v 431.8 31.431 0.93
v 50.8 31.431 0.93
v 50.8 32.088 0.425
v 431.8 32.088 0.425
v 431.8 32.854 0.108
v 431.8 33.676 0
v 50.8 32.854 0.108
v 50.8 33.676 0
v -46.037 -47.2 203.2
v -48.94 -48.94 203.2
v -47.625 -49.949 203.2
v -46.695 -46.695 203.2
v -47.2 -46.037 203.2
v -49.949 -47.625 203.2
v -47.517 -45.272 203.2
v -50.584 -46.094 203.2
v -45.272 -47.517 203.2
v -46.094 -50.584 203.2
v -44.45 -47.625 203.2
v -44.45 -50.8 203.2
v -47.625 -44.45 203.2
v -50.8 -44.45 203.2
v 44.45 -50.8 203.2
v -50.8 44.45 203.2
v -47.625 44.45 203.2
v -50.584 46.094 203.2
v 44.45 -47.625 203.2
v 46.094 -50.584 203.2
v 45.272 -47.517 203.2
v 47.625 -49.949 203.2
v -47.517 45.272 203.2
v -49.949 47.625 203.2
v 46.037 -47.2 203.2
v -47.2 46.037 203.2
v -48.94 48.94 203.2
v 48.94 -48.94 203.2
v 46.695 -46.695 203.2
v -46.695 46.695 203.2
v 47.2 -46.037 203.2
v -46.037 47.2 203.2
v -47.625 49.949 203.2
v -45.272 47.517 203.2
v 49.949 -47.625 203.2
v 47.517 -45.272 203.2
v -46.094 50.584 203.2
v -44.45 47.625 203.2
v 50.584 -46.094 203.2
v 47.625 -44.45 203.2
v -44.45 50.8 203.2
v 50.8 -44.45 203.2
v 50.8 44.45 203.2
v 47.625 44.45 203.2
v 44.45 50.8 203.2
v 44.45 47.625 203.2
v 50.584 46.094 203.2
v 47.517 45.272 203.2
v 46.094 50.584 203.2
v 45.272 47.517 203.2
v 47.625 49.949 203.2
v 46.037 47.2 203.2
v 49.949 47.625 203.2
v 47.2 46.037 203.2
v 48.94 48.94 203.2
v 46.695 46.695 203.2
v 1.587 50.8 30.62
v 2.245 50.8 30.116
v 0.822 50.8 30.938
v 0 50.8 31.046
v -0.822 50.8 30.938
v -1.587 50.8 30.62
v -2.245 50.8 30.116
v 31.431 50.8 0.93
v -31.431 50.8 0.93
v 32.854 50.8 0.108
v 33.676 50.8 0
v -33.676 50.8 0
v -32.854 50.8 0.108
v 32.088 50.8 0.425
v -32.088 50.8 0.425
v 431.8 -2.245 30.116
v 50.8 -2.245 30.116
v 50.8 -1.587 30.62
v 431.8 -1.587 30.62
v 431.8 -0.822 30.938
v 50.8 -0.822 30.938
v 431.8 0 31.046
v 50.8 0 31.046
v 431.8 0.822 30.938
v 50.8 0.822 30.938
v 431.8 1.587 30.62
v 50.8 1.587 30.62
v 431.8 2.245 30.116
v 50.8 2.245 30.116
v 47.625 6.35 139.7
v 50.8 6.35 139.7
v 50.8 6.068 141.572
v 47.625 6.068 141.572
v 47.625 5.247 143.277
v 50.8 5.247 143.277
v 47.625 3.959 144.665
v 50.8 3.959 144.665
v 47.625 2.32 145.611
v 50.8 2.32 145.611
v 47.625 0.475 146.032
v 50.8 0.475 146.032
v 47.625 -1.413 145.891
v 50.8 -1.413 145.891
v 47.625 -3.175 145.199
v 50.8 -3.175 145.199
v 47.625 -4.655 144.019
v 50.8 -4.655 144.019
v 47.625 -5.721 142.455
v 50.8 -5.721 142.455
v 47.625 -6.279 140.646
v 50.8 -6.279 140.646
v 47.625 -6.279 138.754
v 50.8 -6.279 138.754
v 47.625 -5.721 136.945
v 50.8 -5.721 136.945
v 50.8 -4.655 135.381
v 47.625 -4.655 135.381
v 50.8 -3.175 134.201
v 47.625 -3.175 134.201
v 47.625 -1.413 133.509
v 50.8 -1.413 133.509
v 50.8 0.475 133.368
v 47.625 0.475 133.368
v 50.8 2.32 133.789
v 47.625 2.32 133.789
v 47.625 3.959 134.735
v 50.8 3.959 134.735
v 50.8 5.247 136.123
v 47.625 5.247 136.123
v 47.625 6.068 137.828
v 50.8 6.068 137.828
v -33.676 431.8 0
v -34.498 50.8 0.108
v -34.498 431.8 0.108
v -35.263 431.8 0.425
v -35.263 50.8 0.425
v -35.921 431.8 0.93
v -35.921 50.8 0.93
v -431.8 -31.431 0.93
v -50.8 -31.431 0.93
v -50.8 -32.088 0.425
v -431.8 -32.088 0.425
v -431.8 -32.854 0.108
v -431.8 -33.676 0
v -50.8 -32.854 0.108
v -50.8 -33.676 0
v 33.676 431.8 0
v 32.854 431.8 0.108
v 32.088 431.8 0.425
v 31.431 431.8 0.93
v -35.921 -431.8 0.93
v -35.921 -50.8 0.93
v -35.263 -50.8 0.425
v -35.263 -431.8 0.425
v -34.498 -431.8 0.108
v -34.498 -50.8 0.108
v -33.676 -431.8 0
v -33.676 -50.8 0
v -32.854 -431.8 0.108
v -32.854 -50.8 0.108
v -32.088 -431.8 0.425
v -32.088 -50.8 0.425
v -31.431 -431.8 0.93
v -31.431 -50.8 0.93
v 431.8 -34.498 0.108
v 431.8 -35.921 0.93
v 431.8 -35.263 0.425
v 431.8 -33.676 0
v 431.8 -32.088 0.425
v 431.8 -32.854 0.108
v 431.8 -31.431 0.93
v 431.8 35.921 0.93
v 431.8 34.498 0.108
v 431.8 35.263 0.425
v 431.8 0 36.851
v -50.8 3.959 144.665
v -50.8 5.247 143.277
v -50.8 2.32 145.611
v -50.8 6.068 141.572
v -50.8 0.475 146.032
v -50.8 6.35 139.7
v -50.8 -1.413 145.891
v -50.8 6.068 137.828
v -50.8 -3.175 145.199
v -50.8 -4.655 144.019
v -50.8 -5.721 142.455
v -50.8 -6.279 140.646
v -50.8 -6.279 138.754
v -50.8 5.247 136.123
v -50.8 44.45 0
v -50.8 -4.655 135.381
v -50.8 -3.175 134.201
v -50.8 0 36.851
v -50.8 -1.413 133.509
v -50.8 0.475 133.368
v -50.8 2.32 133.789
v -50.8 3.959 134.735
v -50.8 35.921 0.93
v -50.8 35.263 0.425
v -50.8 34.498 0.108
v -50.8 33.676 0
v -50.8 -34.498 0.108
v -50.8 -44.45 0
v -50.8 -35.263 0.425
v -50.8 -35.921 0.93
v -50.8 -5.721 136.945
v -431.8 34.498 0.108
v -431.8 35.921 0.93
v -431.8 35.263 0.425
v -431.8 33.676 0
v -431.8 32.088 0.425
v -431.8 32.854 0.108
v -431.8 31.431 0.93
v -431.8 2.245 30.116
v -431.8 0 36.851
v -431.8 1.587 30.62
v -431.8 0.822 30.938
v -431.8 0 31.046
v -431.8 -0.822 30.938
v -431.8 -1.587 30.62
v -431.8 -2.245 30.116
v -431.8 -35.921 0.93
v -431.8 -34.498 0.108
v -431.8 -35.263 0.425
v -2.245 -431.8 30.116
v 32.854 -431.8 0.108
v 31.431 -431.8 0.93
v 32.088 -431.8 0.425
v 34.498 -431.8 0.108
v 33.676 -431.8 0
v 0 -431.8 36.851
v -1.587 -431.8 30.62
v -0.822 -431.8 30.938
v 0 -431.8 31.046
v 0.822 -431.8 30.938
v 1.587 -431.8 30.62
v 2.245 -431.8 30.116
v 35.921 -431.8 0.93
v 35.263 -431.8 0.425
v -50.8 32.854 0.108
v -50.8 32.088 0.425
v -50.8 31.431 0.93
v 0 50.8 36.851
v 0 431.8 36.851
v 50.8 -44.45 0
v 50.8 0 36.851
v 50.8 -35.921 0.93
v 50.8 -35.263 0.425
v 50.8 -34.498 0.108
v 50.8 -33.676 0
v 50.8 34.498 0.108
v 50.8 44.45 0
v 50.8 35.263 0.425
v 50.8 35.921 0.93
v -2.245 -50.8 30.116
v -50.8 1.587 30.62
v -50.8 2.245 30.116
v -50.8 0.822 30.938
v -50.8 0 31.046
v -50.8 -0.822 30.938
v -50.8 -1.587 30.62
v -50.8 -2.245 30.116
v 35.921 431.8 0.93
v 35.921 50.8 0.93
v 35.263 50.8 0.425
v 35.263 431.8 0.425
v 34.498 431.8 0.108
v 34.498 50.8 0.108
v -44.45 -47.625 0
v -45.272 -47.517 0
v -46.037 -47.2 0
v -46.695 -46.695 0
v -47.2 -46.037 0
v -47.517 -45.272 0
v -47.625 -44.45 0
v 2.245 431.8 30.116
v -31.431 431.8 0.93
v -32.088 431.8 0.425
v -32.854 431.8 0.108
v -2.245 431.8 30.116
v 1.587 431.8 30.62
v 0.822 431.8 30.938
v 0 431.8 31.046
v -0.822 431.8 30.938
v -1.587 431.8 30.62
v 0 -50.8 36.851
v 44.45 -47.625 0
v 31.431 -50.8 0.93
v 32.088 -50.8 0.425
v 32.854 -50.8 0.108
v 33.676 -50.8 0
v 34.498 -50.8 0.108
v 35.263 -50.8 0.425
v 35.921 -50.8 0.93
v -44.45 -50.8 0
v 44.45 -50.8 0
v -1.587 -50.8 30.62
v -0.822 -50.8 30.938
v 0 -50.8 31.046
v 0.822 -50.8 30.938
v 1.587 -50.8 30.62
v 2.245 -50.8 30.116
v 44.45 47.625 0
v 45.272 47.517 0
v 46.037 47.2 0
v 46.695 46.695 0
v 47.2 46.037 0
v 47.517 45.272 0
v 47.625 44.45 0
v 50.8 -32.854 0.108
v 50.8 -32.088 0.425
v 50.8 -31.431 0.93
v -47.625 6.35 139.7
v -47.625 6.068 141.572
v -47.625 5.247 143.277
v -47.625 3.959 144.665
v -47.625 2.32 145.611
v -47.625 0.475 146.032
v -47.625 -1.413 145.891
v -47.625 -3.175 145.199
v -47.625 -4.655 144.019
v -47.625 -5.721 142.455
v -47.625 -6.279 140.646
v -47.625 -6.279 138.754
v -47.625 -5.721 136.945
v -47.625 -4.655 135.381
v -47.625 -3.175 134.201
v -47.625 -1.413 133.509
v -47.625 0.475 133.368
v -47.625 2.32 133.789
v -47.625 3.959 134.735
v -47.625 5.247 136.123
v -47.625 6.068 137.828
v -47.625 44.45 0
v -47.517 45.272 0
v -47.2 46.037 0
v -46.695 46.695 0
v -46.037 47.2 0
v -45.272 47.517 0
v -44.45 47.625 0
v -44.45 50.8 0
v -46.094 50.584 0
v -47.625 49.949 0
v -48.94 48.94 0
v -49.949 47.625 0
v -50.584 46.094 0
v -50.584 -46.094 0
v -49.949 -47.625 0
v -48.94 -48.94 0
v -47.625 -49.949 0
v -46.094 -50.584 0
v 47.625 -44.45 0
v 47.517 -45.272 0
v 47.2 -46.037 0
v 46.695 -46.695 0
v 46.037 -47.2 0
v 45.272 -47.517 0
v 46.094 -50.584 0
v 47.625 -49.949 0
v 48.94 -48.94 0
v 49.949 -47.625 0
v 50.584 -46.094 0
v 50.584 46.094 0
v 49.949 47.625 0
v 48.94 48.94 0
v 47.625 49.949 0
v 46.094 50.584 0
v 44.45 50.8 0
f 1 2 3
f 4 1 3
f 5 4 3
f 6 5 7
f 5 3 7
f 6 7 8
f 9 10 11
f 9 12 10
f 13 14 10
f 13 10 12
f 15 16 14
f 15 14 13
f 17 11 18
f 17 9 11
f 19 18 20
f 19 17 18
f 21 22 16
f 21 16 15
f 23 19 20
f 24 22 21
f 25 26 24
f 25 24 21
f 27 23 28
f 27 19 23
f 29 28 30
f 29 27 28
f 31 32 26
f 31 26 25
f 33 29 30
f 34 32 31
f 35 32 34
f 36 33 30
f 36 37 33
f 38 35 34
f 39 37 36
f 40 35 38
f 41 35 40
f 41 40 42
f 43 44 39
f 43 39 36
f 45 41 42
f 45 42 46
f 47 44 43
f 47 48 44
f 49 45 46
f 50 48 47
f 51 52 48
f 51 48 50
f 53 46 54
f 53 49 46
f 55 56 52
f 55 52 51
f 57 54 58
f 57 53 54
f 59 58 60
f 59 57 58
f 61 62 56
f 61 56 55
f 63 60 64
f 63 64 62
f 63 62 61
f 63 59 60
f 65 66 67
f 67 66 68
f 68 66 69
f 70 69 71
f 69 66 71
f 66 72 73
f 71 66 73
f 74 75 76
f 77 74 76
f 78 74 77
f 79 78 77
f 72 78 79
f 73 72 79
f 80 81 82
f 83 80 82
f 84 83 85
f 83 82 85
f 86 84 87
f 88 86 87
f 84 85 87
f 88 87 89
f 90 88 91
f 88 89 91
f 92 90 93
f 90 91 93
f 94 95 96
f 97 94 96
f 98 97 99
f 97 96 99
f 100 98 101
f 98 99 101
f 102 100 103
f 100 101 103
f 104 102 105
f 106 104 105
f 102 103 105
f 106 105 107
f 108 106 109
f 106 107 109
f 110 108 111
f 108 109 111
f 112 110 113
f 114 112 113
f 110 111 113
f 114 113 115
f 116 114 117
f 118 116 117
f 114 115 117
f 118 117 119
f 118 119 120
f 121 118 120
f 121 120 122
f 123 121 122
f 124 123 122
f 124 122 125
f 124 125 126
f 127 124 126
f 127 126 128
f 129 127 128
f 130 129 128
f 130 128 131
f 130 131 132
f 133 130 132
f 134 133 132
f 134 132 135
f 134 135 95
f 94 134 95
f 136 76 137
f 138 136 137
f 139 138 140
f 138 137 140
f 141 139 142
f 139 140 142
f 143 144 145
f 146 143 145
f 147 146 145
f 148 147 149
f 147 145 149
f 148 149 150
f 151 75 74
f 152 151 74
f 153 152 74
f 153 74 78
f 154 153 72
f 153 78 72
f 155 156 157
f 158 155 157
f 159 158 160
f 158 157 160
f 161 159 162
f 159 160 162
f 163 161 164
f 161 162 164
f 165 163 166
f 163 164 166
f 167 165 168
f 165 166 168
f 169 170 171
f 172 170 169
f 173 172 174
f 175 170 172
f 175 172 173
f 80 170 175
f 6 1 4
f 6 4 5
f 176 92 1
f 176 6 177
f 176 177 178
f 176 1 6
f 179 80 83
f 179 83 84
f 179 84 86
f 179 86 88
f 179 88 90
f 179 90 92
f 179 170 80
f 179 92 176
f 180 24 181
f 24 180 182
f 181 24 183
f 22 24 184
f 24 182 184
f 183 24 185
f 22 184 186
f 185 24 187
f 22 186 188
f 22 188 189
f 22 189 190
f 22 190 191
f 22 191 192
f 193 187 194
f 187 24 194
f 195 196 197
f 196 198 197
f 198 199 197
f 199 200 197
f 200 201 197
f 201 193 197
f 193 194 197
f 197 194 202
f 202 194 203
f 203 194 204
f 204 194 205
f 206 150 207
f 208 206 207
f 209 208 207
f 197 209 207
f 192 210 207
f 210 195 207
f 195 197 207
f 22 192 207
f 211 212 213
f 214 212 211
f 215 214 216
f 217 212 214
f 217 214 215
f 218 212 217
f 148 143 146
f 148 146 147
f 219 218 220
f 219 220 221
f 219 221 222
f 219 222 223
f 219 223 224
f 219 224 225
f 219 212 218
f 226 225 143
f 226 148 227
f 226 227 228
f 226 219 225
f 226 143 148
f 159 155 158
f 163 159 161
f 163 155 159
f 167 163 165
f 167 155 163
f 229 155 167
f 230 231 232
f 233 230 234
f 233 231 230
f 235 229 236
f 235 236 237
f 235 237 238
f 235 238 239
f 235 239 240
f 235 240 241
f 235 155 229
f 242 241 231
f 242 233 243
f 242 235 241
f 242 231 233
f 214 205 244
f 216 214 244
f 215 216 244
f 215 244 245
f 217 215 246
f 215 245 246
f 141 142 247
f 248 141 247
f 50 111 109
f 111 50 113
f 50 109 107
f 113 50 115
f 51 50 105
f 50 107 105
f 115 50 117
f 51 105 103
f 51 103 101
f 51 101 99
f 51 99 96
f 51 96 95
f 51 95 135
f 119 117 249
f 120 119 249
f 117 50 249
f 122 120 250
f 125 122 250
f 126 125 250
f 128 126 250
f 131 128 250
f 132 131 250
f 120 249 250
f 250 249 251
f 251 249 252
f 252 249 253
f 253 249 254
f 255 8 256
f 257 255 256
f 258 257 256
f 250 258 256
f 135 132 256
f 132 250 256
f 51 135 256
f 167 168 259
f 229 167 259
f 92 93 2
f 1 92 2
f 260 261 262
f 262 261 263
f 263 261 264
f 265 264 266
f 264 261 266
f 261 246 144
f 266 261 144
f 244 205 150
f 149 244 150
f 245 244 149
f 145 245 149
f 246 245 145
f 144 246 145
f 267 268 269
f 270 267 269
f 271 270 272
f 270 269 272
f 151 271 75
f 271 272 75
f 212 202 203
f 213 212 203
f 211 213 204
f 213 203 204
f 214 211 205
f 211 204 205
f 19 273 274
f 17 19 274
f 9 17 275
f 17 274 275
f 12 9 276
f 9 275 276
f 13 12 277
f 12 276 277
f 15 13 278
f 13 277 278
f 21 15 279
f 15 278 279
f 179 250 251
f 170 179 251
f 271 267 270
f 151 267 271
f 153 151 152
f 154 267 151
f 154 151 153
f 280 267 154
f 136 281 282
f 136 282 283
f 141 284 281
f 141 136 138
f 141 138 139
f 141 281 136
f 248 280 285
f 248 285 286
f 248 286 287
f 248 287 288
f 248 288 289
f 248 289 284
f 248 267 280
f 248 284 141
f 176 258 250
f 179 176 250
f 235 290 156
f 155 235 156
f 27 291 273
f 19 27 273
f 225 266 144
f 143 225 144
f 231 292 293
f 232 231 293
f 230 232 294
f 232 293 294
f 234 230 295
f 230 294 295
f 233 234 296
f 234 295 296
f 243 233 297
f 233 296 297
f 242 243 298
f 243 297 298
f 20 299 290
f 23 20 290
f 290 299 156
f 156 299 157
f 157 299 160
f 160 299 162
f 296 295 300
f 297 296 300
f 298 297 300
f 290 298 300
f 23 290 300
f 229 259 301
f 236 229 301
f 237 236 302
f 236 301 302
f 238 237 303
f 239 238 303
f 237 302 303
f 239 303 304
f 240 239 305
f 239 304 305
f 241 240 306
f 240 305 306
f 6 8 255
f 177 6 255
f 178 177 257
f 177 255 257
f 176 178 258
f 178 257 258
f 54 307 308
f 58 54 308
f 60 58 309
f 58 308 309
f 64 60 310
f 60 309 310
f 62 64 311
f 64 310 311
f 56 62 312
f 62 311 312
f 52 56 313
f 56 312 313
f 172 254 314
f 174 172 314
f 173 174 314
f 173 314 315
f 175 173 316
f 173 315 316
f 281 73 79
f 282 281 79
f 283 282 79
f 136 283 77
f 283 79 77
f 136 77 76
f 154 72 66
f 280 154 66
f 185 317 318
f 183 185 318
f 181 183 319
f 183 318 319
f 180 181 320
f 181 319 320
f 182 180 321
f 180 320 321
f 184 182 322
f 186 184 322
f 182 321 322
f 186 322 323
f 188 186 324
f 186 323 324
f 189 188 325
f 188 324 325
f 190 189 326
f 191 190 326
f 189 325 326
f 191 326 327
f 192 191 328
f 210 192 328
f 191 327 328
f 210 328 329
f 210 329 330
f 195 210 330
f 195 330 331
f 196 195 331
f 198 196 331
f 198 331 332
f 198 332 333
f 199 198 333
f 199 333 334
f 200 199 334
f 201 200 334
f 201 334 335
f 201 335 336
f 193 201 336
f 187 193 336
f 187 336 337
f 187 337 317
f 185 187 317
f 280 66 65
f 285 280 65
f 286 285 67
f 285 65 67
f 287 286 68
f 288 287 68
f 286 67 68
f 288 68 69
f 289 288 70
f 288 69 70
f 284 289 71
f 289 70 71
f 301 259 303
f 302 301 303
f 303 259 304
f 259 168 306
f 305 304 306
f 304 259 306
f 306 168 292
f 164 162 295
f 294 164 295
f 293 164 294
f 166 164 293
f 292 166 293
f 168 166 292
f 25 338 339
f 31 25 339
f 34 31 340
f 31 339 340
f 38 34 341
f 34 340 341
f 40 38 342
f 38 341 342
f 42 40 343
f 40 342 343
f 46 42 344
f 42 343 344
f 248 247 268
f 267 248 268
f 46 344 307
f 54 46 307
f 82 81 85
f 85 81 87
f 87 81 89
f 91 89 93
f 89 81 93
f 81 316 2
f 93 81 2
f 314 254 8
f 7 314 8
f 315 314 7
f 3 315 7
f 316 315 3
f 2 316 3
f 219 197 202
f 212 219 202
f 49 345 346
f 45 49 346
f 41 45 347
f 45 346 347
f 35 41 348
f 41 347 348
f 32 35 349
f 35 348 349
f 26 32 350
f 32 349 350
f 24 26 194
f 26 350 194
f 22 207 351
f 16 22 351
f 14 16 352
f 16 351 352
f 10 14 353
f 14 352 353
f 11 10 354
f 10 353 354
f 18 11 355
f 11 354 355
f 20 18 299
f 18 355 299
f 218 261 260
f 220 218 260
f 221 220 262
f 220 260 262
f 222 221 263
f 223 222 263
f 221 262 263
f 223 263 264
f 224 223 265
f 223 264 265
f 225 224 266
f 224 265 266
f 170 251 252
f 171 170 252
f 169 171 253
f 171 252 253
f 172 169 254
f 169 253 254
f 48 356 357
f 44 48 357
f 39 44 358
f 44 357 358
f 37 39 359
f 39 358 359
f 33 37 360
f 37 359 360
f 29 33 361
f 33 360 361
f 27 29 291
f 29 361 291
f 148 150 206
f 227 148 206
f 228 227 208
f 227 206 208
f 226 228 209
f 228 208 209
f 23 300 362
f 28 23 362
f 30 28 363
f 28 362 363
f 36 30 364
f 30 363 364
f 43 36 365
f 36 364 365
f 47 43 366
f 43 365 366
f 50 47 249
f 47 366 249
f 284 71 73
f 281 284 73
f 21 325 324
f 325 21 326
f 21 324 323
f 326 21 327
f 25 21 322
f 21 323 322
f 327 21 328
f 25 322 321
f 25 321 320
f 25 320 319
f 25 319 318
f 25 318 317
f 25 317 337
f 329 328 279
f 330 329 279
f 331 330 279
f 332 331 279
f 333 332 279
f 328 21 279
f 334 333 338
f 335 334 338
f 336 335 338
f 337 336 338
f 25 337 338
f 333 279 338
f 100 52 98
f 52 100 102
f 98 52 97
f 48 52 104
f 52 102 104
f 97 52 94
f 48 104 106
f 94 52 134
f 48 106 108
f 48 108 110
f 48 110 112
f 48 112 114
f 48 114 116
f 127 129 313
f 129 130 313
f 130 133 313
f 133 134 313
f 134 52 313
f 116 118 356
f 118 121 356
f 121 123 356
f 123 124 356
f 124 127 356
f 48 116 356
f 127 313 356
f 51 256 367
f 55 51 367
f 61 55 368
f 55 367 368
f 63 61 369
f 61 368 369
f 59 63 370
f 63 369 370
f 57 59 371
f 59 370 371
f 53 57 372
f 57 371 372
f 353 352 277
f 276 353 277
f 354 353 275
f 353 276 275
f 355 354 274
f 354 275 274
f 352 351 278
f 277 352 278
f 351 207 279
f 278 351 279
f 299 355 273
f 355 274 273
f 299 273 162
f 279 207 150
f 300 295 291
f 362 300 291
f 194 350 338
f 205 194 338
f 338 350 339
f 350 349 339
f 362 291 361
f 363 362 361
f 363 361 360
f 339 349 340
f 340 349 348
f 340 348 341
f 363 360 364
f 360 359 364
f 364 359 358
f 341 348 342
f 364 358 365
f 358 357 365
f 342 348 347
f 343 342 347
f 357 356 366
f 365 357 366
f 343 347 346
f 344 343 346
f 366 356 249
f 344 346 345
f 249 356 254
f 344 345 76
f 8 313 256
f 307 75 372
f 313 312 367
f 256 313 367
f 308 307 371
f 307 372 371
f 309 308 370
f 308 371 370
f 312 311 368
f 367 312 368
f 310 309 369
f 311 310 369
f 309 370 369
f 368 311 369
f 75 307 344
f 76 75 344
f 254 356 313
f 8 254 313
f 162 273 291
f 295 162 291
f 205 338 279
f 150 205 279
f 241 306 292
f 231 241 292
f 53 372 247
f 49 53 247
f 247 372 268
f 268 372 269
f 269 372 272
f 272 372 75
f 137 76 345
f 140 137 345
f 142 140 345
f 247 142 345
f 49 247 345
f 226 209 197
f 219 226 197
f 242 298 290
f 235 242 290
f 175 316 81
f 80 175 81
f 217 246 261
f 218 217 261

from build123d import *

# Parameters (mm, degrees)
F1_DEPTH  = 203.2
F3_D      = 12.7
F8_DEPTH  = 381
F9_DEPTH  = 381
F10_DEPTH = 381
F11_DEPTH = 381


with BuildPart() as f1:
    # F0 (on Top) → F1 (new body)
    with BuildSketch(Plane.XY):
        with BuildLine():
            ThreePointArc((50.8, 44.45), (48.940128, 48.940128), (44.45, 50.8))
            Line((44.45, 50.8), (-44.45, 50.8))
            ThreePointArc((-44.45, 50.8), (-48.940128, 48.940128), (-50.8, 44.45))
            Line((-50.8, 44.45), (-50.8, -44.45))
            ThreePointArc((-50.8, -44.45), (-48.940128, -48.940128), (-44.45, -50.8))
            Line((-44.45, -50.8), (44.45, -50.8))
            ThreePointArc((44.45, -50.8), (48.940128, -48.940128), (50.8, -44.45))
            Line((50.8, -44.45), (50.8, 44.45))
        make_face()
        with BuildLine():
            ThreePointArc((44.45, 47.625), (46.695064, 46.695064), (47.625, 44.45))
            Line((47.625, 44.45), (47.625, -44.45))
            ThreePointArc((47.625, -44.45), (46.695064, -46.695064), (44.45, -47.625))
            Line((44.45, -47.625), (-44.45, -47.625))
            ThreePointArc((-44.45, -47.625), (-46.695064, -46.695064), (-47.625, -44.45))
            Line((-47.625, -44.45), (-47.625, 44.45))
            ThreePointArc((-47.625, 44.45), (-46.695064, 46.695064), (-44.45, 47.625))
            Line((-44.45, 47.625), (44.45, 47.625))
        make_face(mode=Mode.SUBTRACT)
    extrude(amount=F1_DEPTH)

    # F3 (through all)
    with Locations(Plane(origin=(-50.8, 0, 0), x_dir=(0, -1, 0), z_dir=(-1, 0, 0))):
        with Locations((0, 139.7)):
            Hole(F3_D / 2)

    # F7 (on face) → F8 (join)
    with BuildSketch(Plane.XZ.offset(50.8)):
        with BuildLine():
            Line((-31.430896, 0.929936), (-2.245064, 30.115768))
            ThreePointArc((-2.245064, 30.115768), (0, 31.045704), (2.245064, 30.115768))
            Line((2.245064, 30.115768), (31.430896, 0.929936))
            ThreePointArc((31.430896, 0.929936), (33.67596, 0), (35.921024, 0.929936))
            Line((35.921024, 0.929936), (0, 36.85096))
            Line((0, 36.85096), (-35.921024, 0.929936))
            ThreePointArc((-35.921024, 0.929936), (-33.67596, 0), (-31.430896, 0.929936))
        make_face()
    extrude(amount=F8_DEPTH)

    # F4 (on face) → F9 (join)
    with BuildSketch(Plane.YZ.offset(50.8)):
        with BuildLine():
            Line((35.921024, 0.929936), (0, 36.85096))
            Line((0, 36.85096), (-35.921024, 0.929936))
            ThreePointArc((-35.921024, 0.929936), (-34.89098, 0.241682), (-33.67596, 0))
            ThreePointArc((-33.67596, 0), (-32.460941, 0.241682), (-31.430896, 0.929936))
            Line((-31.430896, 0.929936), (-2.245064, 30.115768))
            ThreePointArc((-2.245064, 30.115768), (0, 31.045704), (2.245064, 30.115768))
            Line((2.245064, 30.115768), (31.430896, 0.929936))
            ThreePointArc((31.430896, 0.929936), (32.460941, 0.241682), (33.67596, 0))
            ThreePointArc((33.67596, 0), (34.89098, 0.241682), (35.921024, 0.929936))
        make_face()
    extrude(amount=F9_DEPTH)

    # F5 (on face) → F10 (join)
    with BuildSketch(Plane(origin=(0, 50.8, 0), x_dir=(-1, 0, 0), z_dir=(0, 1, 0))):
        with BuildLine():
            Line((35.921024, 0.929936), (0, 36.85096))
            Line((0, 36.85096), (-35.921024, 0.929936))
            ThreePointArc((-35.921024, 0.929936), (-34.89098, 0.241682), (-33.67596, 0))
            ThreePointArc((-33.67596, 0), (-32.460941, 0.241682), (-31.430896, 0.929936))
            Line((-31.430896, 0.929936), (-2.245064, 30.115768))
            ThreePointArc((-2.245064, 30.115768), (0, 31.045704), (2.245064, 30.115768))
            Line((2.245064, 30.115768), (31.430896, 0.929936))
            ThreePointArc((31.430896, 0.929936), (32.460941, 0.241682), (33.67596, 0))
            ThreePointArc((33.67596, 0), (34.89098, 0.241682), (35.921024, 0.929936))
        make_face()
    extrude(amount=F10_DEPTH)

    # F6 (on face) → F11 (join)
    with BuildSketch(Plane(origin=(-50.8, 0, 0), x_dir=(0, -1, 0), z_dir=(-1, 0, 0))):
        with BuildLine():
            Line((-31.430896, 0.929936), (-2.245064, 30.115768))
            ThreePointArc((-2.245064, 30.115768), (0, 31.045704), (2.245064, 30.115768))
            Line((2.245064, 30.115768), (31.430896, 0.929936))
            ThreePointArc((31.430896, 0.929936), (32.460941, 0.241682), (33.67596, 0))
            ThreePointArc((33.67596, 0), (34.89098, 0.241682), (35.921024, 0.929936))
            Line((35.921024, 0.929936), (0, 36.85096))
            Line((0, 36.85096), (-35.921024, 0.929936))
            ThreePointArc((-35.921024, 0.929936), (-34.89098, 0.241682), (-33.67596, 0))
            ThreePointArc((-33.67596, 0), (-32.460941, 0.241682), (-31.430896, 0.929936))
        make_face()
    extrude(amount=F11_DEPTH)


solid = f1.part
